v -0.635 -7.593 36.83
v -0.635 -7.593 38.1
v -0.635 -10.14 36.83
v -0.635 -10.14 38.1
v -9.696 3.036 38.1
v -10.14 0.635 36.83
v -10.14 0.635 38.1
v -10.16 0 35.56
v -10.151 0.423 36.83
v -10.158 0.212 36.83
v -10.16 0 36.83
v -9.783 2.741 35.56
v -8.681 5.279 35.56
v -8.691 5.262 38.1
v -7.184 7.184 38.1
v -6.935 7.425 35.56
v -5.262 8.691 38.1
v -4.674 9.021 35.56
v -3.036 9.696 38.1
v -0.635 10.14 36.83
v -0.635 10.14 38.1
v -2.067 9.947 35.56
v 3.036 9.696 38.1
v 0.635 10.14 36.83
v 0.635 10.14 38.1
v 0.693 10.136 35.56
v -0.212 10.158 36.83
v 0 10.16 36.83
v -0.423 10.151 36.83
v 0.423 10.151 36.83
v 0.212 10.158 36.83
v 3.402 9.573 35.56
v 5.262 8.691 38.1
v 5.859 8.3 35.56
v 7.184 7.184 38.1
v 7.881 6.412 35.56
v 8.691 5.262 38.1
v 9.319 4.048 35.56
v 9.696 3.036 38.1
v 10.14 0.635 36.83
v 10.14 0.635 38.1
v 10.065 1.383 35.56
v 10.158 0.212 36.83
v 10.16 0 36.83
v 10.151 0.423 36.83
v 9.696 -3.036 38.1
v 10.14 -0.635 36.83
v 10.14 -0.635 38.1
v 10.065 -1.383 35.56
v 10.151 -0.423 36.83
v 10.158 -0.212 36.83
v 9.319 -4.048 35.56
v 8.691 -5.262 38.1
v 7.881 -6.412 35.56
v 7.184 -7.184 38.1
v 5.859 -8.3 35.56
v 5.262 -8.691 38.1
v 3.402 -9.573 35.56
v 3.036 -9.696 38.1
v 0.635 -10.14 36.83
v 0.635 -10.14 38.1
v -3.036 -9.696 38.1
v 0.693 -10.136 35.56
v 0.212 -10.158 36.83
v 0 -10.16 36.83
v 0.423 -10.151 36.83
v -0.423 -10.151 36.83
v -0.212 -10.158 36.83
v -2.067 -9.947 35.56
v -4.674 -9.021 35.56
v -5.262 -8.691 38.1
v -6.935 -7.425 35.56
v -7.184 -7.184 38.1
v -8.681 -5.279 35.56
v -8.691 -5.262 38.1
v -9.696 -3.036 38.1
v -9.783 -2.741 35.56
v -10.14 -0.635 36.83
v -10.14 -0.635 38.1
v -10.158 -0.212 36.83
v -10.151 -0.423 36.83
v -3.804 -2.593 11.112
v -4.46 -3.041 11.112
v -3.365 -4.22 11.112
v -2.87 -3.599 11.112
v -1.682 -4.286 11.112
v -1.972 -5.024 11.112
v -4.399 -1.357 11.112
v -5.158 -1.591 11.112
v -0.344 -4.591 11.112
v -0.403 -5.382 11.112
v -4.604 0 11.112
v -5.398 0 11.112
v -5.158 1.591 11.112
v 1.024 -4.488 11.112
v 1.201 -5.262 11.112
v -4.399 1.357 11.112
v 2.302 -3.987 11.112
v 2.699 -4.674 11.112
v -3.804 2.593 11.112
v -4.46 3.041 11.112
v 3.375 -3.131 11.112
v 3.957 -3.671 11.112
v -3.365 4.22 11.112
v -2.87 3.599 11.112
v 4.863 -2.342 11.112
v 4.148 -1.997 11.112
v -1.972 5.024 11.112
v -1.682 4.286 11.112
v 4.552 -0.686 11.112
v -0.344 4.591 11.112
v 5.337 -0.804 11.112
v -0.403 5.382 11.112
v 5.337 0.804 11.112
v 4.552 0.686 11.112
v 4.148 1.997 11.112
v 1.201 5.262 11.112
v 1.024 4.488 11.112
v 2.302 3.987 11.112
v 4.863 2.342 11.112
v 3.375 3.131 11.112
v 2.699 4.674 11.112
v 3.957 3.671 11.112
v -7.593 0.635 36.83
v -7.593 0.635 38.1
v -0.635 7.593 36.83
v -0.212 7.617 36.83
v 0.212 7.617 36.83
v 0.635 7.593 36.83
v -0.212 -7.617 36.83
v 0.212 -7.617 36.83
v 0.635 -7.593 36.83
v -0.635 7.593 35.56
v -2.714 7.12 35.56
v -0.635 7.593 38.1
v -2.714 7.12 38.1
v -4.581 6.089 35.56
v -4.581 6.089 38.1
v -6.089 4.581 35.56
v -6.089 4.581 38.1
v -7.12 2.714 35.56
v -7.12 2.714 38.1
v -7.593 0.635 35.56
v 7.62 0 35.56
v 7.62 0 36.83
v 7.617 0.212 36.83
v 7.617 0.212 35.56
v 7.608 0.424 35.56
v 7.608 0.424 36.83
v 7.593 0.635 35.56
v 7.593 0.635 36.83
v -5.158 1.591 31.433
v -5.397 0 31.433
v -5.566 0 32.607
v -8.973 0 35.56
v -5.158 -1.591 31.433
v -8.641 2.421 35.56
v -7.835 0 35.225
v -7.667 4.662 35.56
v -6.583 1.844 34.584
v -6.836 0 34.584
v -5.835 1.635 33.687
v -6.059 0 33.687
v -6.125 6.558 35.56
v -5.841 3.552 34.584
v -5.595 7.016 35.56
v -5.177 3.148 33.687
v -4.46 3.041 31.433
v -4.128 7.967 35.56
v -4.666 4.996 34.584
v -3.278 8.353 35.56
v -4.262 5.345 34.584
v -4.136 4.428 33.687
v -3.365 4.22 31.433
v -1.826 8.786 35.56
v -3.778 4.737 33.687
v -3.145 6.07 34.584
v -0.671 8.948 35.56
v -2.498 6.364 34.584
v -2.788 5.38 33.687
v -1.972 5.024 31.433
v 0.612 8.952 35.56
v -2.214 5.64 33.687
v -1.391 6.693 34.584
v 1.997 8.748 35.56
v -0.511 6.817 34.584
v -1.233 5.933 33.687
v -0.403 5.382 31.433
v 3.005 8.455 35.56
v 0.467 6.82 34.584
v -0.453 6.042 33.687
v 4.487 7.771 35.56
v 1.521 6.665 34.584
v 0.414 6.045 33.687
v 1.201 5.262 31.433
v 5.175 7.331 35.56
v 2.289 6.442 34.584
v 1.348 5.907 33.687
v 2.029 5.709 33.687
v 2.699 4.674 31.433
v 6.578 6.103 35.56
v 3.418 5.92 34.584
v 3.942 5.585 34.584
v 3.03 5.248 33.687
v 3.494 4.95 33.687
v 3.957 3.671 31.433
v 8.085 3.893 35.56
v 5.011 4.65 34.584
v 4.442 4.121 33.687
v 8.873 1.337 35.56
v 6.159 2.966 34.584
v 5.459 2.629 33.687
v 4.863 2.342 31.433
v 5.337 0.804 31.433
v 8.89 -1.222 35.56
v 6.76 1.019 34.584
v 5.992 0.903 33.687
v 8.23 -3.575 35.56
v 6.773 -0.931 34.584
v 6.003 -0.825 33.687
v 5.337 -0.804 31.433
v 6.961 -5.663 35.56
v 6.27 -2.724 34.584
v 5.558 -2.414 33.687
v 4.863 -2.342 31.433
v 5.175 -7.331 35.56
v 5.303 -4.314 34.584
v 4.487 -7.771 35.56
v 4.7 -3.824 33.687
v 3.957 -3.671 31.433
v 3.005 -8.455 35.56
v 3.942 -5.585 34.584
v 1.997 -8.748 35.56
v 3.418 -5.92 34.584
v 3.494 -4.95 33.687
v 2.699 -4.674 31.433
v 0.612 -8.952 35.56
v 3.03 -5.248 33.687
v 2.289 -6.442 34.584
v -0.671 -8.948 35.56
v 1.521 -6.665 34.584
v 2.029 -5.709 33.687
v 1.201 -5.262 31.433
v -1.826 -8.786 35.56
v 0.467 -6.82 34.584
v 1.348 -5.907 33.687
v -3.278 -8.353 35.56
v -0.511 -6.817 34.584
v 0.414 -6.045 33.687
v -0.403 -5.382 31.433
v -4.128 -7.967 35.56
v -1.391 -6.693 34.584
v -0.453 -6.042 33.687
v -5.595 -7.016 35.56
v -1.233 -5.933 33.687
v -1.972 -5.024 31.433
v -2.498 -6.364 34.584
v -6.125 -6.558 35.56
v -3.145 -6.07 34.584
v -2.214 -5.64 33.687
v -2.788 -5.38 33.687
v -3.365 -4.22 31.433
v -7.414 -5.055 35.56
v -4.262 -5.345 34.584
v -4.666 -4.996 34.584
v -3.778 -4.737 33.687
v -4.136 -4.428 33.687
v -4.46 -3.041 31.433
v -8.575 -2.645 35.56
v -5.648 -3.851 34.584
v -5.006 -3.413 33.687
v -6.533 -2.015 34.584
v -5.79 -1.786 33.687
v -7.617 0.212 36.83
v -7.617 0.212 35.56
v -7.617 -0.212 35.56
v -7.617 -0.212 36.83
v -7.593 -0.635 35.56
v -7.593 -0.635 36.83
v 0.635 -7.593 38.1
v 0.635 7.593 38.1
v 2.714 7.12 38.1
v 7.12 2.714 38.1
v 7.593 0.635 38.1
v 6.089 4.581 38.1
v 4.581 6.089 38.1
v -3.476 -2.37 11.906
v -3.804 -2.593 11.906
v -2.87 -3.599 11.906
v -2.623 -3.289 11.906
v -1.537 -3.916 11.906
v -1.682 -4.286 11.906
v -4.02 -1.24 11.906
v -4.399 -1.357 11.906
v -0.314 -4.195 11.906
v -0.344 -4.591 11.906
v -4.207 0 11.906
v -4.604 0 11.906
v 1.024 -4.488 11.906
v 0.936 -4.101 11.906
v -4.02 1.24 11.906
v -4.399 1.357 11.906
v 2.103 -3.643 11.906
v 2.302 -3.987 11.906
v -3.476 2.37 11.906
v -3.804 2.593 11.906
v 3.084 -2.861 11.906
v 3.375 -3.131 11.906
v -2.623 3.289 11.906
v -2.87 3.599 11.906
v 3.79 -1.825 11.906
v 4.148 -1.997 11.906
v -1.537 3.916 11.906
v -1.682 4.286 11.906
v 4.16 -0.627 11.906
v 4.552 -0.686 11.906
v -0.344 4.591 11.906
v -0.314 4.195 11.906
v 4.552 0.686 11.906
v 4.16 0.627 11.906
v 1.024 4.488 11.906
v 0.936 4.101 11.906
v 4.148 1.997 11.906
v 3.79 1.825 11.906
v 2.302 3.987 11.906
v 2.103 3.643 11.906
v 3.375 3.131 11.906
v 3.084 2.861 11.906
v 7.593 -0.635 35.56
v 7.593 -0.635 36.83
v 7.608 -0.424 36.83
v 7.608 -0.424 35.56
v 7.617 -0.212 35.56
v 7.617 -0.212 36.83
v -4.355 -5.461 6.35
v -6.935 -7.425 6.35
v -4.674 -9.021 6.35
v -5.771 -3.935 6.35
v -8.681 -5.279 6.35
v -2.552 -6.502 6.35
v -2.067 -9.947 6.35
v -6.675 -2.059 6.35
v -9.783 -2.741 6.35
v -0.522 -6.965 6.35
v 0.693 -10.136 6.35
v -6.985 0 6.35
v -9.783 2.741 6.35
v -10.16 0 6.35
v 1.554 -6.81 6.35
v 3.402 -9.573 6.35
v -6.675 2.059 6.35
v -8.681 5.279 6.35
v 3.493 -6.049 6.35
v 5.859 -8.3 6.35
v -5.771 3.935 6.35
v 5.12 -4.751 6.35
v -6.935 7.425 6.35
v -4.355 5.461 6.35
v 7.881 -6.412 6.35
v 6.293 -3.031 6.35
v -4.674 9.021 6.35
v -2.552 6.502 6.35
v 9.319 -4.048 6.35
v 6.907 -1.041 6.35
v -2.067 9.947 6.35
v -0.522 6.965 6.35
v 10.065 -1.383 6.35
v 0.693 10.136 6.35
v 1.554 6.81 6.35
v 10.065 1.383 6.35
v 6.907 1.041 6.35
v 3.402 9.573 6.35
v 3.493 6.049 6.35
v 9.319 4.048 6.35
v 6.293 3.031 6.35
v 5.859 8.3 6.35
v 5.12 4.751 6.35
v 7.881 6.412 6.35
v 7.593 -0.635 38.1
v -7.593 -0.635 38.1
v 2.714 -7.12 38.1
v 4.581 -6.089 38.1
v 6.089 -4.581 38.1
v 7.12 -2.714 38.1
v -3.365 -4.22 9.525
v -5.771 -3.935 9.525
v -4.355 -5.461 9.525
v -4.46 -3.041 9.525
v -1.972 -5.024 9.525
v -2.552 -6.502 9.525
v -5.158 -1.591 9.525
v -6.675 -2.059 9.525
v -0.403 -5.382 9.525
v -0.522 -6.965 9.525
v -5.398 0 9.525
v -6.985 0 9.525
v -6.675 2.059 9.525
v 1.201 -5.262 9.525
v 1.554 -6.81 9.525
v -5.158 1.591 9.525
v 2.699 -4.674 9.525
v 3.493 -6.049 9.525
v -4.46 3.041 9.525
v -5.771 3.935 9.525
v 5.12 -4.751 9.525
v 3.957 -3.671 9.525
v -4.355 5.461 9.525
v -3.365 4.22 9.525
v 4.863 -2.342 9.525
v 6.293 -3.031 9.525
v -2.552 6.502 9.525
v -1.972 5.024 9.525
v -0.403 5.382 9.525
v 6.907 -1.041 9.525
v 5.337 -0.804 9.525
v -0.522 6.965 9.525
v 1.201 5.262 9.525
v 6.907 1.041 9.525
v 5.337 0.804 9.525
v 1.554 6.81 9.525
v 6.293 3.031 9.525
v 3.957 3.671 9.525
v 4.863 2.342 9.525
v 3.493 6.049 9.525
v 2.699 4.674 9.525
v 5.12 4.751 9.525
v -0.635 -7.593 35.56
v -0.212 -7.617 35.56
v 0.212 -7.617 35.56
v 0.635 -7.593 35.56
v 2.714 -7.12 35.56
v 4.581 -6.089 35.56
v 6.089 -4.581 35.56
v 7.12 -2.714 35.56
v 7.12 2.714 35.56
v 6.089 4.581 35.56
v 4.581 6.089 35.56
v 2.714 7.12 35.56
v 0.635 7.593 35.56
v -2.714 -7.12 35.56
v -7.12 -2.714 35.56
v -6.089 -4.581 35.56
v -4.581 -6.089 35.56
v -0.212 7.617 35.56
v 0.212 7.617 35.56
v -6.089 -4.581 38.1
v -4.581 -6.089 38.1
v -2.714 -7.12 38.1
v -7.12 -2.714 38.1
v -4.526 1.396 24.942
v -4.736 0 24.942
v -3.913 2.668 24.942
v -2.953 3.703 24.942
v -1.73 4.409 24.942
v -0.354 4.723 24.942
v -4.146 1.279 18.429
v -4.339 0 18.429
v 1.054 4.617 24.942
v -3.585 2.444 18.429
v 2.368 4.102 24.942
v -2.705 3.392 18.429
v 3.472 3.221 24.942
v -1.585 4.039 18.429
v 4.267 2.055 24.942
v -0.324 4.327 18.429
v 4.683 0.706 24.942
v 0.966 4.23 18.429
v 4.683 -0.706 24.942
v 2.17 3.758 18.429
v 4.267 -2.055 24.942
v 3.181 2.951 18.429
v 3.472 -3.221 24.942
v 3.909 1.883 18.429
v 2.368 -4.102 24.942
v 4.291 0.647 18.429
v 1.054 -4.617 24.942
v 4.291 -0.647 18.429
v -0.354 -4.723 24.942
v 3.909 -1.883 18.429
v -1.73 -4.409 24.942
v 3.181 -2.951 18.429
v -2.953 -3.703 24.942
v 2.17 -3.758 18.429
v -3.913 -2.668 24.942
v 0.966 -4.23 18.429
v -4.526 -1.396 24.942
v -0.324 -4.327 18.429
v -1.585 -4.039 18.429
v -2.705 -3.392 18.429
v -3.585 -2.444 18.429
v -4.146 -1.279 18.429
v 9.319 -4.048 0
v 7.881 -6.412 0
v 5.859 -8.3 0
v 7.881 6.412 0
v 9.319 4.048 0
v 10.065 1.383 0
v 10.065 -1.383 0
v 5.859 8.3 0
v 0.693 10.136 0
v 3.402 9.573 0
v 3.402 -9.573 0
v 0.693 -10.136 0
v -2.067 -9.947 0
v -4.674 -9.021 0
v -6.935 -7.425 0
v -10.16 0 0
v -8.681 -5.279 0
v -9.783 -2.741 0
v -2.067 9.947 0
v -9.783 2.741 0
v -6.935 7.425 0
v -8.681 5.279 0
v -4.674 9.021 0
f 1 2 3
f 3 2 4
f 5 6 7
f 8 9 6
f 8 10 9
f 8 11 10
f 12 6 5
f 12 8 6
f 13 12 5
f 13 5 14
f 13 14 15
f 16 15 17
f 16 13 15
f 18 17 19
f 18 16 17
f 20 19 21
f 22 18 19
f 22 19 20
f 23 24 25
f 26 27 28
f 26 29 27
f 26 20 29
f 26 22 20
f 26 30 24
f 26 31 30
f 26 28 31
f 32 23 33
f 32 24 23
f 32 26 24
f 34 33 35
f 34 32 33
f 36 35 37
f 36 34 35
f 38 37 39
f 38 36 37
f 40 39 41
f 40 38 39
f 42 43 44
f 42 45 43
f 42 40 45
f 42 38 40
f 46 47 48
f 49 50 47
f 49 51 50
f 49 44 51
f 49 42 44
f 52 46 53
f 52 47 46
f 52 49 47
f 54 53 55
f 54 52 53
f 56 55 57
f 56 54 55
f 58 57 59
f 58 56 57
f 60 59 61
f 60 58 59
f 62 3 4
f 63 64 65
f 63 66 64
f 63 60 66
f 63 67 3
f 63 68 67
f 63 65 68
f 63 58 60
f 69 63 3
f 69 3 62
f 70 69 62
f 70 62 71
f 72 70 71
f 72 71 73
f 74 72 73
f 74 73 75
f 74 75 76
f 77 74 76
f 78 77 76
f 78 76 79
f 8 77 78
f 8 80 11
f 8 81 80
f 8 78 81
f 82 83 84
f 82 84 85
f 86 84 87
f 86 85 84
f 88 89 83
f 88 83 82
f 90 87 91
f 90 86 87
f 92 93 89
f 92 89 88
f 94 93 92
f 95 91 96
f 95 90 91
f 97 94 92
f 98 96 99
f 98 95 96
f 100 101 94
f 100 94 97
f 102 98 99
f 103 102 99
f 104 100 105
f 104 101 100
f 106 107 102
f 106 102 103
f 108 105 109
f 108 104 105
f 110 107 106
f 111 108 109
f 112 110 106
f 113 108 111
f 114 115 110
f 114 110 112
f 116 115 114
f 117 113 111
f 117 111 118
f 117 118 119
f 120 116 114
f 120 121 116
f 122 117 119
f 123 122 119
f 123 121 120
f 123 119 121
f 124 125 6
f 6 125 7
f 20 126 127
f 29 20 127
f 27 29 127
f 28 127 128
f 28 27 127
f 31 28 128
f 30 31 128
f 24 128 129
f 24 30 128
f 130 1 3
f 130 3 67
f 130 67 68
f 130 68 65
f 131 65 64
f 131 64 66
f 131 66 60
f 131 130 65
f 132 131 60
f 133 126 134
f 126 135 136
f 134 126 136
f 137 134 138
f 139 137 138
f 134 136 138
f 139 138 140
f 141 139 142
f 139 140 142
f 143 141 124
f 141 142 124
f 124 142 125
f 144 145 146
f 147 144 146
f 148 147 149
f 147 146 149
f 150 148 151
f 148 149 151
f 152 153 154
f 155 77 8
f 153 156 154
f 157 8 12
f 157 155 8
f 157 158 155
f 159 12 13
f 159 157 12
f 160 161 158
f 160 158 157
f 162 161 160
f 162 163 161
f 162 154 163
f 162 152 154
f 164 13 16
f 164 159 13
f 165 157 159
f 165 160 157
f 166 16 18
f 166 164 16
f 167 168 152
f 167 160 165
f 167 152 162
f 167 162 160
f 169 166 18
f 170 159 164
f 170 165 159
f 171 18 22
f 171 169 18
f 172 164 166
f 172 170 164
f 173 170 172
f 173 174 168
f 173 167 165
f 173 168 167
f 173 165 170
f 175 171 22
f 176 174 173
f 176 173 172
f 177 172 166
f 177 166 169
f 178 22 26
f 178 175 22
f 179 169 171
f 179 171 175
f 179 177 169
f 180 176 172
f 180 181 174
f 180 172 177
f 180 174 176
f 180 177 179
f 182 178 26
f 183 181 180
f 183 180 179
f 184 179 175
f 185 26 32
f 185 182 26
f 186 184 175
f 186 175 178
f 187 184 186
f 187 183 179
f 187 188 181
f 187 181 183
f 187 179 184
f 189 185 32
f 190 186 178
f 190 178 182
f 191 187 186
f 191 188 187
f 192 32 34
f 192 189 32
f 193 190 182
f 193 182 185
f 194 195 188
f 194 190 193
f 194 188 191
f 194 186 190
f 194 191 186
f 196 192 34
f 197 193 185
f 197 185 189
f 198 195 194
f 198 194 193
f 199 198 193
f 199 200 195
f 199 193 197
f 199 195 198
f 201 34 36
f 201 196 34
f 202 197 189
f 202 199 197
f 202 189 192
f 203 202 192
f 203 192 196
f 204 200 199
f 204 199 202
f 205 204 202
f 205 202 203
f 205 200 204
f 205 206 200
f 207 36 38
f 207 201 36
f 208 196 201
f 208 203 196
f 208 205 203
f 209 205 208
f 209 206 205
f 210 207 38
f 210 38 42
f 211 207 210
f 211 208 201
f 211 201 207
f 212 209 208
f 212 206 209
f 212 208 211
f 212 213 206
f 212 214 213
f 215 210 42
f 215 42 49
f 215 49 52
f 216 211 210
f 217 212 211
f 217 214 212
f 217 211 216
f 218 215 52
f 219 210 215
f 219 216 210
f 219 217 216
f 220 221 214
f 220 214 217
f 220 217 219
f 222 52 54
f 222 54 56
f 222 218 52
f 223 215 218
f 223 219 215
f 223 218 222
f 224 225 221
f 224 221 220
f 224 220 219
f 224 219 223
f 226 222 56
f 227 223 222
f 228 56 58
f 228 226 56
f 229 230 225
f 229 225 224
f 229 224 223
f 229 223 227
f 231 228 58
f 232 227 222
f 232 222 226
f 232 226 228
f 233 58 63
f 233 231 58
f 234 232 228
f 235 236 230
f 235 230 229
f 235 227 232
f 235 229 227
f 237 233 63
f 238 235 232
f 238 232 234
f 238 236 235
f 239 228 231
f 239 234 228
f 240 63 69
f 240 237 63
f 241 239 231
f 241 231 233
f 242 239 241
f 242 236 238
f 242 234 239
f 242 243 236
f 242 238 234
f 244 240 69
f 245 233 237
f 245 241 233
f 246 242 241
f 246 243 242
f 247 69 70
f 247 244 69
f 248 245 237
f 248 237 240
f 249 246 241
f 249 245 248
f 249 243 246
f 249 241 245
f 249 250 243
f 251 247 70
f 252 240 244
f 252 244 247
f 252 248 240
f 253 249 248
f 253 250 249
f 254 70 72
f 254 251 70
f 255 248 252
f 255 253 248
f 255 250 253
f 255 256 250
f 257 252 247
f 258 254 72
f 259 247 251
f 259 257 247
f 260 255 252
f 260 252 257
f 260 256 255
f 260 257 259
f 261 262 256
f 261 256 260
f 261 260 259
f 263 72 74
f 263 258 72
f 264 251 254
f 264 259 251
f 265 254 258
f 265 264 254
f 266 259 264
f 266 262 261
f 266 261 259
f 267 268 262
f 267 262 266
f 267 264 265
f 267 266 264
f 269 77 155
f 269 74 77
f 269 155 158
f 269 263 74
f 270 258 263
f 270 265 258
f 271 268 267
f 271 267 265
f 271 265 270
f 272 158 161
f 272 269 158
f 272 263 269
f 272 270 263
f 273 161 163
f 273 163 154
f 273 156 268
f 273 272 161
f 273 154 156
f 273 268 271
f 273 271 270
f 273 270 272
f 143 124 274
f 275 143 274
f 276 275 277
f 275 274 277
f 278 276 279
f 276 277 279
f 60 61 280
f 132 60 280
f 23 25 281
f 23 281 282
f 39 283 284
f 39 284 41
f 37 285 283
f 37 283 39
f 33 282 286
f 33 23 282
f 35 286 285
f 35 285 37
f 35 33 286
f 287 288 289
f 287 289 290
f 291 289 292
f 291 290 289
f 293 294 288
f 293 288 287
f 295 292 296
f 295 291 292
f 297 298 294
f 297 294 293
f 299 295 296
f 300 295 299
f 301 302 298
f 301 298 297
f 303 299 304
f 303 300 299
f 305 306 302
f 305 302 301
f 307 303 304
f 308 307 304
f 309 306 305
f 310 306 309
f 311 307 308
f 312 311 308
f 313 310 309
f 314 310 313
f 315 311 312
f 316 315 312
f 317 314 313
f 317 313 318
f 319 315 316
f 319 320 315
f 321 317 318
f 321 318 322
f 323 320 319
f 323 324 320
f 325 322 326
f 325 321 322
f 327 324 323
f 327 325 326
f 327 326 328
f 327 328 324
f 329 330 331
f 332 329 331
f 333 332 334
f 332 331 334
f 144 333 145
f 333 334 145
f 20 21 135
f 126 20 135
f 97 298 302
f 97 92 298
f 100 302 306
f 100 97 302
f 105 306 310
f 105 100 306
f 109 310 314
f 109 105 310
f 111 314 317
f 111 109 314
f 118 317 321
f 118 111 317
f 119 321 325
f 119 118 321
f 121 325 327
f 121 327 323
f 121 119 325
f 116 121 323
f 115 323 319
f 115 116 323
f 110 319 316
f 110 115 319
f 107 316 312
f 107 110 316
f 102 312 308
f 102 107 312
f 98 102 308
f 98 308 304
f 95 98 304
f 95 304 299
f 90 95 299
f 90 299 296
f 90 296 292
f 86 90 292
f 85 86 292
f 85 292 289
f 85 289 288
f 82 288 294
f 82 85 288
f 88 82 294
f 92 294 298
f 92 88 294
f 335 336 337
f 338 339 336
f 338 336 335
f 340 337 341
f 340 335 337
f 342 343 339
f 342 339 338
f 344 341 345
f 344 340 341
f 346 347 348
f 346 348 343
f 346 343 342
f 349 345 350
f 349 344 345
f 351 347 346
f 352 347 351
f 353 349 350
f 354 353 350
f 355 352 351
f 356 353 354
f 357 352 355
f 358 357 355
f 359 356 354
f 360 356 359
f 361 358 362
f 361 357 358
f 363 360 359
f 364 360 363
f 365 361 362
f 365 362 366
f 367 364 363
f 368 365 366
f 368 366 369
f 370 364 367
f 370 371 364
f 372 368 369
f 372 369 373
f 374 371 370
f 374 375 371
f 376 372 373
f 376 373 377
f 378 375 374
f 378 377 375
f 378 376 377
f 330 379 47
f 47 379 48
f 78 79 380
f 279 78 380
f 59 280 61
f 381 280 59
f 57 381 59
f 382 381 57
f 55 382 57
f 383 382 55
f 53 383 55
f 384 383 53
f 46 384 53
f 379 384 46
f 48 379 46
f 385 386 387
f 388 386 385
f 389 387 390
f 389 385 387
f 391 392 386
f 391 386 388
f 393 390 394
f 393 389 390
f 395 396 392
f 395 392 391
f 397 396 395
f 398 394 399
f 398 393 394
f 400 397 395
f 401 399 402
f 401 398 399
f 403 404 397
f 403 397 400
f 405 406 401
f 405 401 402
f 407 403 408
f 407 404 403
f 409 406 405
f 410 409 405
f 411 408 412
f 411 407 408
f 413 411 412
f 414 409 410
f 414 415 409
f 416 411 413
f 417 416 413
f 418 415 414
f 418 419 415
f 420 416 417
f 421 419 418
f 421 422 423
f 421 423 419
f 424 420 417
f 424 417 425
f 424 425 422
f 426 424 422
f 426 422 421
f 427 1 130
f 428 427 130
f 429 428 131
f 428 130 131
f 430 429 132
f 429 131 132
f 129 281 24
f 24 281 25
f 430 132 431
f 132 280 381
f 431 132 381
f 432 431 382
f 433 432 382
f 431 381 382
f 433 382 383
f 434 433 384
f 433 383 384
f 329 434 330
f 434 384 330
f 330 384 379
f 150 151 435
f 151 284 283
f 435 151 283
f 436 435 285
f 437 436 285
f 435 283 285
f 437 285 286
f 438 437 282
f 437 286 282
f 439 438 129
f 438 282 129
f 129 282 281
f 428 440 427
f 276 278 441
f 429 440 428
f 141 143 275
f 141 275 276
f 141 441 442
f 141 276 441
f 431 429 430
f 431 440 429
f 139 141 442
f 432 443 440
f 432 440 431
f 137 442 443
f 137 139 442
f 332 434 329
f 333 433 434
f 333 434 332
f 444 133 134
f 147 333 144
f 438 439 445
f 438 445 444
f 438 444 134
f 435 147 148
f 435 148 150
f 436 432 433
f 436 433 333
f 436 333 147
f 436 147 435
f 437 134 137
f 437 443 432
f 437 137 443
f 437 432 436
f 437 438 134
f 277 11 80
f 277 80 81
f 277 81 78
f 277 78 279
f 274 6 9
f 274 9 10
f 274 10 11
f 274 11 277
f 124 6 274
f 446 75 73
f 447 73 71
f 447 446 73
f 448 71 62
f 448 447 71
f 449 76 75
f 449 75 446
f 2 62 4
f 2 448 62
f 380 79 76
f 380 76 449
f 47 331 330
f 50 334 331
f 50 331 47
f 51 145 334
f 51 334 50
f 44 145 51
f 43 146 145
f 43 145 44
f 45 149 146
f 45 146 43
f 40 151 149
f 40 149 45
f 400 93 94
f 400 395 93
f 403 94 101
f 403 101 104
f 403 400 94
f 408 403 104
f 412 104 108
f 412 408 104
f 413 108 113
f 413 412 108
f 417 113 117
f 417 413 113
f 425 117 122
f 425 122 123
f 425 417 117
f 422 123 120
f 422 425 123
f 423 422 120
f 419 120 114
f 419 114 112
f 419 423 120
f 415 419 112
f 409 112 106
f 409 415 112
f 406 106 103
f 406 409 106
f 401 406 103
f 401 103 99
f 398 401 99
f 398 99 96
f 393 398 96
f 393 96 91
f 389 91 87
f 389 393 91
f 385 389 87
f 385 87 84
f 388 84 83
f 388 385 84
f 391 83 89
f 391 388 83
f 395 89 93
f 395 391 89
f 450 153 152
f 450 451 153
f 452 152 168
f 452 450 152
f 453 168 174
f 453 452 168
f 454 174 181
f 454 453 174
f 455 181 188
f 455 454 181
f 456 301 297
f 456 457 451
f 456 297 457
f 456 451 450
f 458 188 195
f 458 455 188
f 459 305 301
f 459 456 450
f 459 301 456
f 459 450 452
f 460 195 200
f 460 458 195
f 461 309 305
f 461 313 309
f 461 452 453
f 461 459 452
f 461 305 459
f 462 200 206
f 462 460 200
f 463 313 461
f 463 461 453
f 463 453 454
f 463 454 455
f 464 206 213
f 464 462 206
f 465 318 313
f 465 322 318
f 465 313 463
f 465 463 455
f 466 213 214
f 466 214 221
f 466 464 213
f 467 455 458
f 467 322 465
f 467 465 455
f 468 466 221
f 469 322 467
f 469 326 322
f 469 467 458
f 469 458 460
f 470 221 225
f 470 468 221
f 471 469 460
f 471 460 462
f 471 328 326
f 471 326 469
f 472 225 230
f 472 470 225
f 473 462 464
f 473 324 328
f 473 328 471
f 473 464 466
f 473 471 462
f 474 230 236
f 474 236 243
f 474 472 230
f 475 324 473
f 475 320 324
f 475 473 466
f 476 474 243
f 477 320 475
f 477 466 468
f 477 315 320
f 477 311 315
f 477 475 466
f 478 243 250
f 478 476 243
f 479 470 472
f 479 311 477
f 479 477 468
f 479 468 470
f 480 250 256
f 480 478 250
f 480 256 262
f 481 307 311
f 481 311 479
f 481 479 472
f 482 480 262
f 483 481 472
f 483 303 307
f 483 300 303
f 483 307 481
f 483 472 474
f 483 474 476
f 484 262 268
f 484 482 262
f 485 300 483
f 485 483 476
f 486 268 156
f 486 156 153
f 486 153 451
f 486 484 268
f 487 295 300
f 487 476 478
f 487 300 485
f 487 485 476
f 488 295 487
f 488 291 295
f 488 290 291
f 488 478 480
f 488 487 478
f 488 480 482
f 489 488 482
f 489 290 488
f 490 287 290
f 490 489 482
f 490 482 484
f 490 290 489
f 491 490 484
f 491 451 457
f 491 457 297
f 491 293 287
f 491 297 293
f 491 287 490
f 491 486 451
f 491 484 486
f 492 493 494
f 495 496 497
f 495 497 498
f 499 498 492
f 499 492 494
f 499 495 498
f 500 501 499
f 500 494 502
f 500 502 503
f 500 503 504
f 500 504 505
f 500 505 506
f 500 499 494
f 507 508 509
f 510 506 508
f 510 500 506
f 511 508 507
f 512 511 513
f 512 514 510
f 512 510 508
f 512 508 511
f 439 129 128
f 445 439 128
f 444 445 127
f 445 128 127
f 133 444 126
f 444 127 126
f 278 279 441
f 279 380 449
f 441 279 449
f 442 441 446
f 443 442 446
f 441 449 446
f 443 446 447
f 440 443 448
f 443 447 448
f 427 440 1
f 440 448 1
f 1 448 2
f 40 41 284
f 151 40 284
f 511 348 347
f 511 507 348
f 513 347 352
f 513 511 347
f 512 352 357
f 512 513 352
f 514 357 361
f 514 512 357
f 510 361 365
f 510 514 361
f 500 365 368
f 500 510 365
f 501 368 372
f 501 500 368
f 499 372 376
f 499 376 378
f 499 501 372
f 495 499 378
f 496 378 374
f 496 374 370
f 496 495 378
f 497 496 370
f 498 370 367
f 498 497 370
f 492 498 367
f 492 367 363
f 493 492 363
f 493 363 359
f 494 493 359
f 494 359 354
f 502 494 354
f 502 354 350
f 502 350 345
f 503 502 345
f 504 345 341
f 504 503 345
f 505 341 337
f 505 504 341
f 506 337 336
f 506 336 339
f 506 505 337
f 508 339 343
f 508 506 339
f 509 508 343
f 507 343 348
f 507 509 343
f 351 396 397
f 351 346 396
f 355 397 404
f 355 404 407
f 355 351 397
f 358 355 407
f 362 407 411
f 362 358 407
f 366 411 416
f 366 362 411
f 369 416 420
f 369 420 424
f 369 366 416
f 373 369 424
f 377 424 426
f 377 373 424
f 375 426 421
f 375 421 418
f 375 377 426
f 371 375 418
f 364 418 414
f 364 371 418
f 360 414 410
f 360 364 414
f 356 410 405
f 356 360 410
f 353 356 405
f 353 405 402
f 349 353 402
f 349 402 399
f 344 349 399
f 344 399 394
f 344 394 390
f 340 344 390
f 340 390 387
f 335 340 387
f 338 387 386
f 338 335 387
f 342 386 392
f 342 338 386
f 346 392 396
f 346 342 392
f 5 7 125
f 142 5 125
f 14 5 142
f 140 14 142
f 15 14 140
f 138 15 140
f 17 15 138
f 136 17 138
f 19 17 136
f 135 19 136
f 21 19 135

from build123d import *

# Parameters (mm, degrees)
F3_DEPTH = 2.54
F4_DEPTH = 1.27


with BuildPart() as f1:
    # F0 (on Front) → F1 (revolve)
    with BuildSketch(Plane.XZ):
        with BuildLine():
            Line((-10.16, 0), (0, 0))
            Line((0, 0), (0, 38.1))
            Line((0, 38.1), (-10.16, 38.1))
            Line((-10.16, 38.1), (-10.16, 35.56))
            ThreePointArc((-10.16, 35.56), (-6.8363821432, 34.5835975271), (-5.3975, 31.4325))
            ThreePointArc((-5.3975, 31.4325), (-4.5044566757, 21.6875293186), (-4.206875, 11.90625))
            Line((-4.206875, 11.90625), (-4.60375, 11.90625))
            Line((-4.60375, 11.90625), (-4.60375, 11.1125))
            Line((-4.60375, 11.1125), (-5.3975, 11.1125))
            Line((-5.3975, 11.1125), (-5.3975, 9.525))
            Line((-5.3975, 9.525), (-6.985, 9.525))
            Line((-6.985, 9.525), (-6.985, 6.35))
            Line((-6.985, 6.35), (-10.16, 6.35))
            Line((-10.16, 6.35), (-10.16, 0))
        make_face()
    revolve(axis=Axis((0, 0, 19.05), (0, 0, -1)))

    # F2 (on face) → F3 (cut)
    with BuildSketch(Plane.XY.offset(38.1)):
        with BuildLine():
            ThreePointArc((0.635, -7.5934955719), (5.3881536726, -5.3881536726), (7.5934955719, -0.635))
            Line((7.5934955719, -0.635), (0.635, -0.635))
            Line((0.635, -0.635), (0.635, -7.5934955719))
        make_face()
        with BuildLine():
            ThreePointArc((-0.635, -7.5934955719), (0, -7.62), (0.635, -7.5934955719))
            Line((0.635, -7.5934955719), (0.635, -0.635))
            Line((0.635, -0.635), (0, -0.635))
            Line((0, -0.635), (-0.635, -0.635))
            Line((-0.635, -0.635), (-0.635, -7.5934955719))
        make_face()
        with BuildLine():
            ThreePointArc((-7.5934955719, -0.635), (-5.3881536726, -5.3881536726), (-0.635, -7.5934955719))
            Line((-0.635, -7.5934955719), (-0.635, -0.635))
            Line((-0.635, -0.635), (-7.5934955719, -0.635))
        make_face()
        with BuildLine():
            Line((-0.635, 0.635), (-7.5934955719, 0.635))
            ThreePointArc((-7.5934955719, 0.635), (-7.62, 0), (-7.5934955719, -0.635))
            Line((-7.5934955719, -0.635), (-0.635, -0.635))
            Line((-0.635, -0.635), (-0.635, 0))
            Line((-0.635, 0), (-0.635, 0.635))
        make_face()
        with BuildLine():
            Line((-0.635, 0.635), (-0.635, 7.5934955719))
            ThreePointArc((-0.635, 7.5934955719), (-5.3881536726, 5.3881536726), (-7.5934955719, 0.635))
            Line((-7.5934955719, 0.635), (-0.635, 0.635))
        make_face()
        with BuildLine():
            Line((0.635, 0.635), (0.635, 7.5934955719))
            ThreePointArc((0.635, 7.5934955719), (0, 7.62), (-0.635, 7.5934955719))
            Line((-0.635, 7.5934955719), (-0.635, 0.635))
            Line((-0.635, 0.635), (0, 0.635))
            Line((0, 0.635), (0.635, 0.635))
        make_face()
        with BuildLine():
            Line((0.635, 0.635), (7.5934955719, 0.635))
            ThreePointArc((7.5934955719, 0.635), (5.3881536726, 5.3881536726), (0.635, 7.5934955719))
            Line((0.635, 7.5934955719), (0.635, 0.635))
        make_face()
        Polygon((0.635, 0), (0.635, 0.635), (0, 0.635), (-0.635, 0.635), (-0.635, 0), (-0.635, -0.635), (0, -0.635), (0.635, -0.635), align=None)
        with BuildLine():
            ThreePointArc((7.5934955719, -0.635), (7.6133710095, -0.3177764484), (7.62, 0))
            ThreePointArc((7.62, 0), (7.6133710095, 0.3177764484), (7.5934955719, 0.635))
            Line((7.5934955719, 0.635), (0.635, 0.635))
            Line((0.635, 0.635), (0.635, 0))
            Line((0.635, 0), (0.635, -0.635))
            Line((0.635, -0.635), (7.5934955719, -0.635))
        make_face()
    extrude(amount=-F3_DEPTH, mode=Mode.SUBTRACT)

    # F2 (on face) → F4 (cut)
    with BuildSketch(Plane.XY.offset(38.1)):
        with BuildLine():
            ThreePointArc((-7.5934955719, -0.635), (-7.62, 0), (-7.5934955719, 0.635))
            Line((-7.5934955719, 0.635), (-10.1401368334, 0.635))
            ThreePointArc((-10.1401368334, 0.635), (-10.1550329942, 0.3176552949), (-10.16, 0))
            ThreePointArc((-10.16, 0), (-10.1550329942, -0.3176552949), (-10.1401368334, -0.635))
            Line((-10.1401368334, -0.635), (-7.5934955719, -0.635))
        make_face()
        with BuildLine():
            ThreePointArc((-0.635, 7.5934955719), (0, 7.62), (0.635, 7.5934955719))
            Line((0.635, 7.5934955719), (0.635, 10.1401368334))
            ThreePointArc((0.635, 10.1401368334), (0.3176552949, 10.1550329942), (0, 10.16))
            ThreePointArc((0, 10.16), (-0.3176552949, 10.1550329942), (-0.635, 10.1401368334))
            Line((-0.635, 10.1401368334), (-0.635, 7.5934955719))
        make_face()
        with BuildLine():
            ThreePointArc((7.5934955719, 0.635), (7.6133710095, 0.3177764484), (7.62, 0))
            ThreePointArc((7.62, 0), (7.6133710095, -0.3177764484), (7.5934955719, -0.635))
            Line((7.5934955719, -0.635), (10.1401368334, -0.635))
            ThreePointArc((10.1401368334, -0.635), (10.1550329942, -0.3176552949), (10.16, 0))
            ThreePointArc((10.16, 0), (10.1550329942, 0.3176552949), (10.1401368334, 0.635))
            Line((10.1401368334, 0.635), (7.5934955719, 0.635))
        make_face()
        with BuildLine():
            Line((0.635, -10.1401368334), (0.635, -7.5934955719))
            ThreePointArc((0.635, -7.5934955719), (0, -7.62), (-0.635, -7.5934955719))
            Line((-0.635, -7.5934955719), (-0.635, -10.1401368334))
            ThreePointArc((-0.635, -10.1401368334), (-0.3176552949, -10.1550329942), (0, -10.16))
            ThreePointArc((0, -10.16), (0.3176552949, -10.1550329942), (0.635, -10.1401368334))
        make_face()
    extrude(amount=-F4_DEPTH, mode=Mode.SUBTRACT)


solid = f1.part
